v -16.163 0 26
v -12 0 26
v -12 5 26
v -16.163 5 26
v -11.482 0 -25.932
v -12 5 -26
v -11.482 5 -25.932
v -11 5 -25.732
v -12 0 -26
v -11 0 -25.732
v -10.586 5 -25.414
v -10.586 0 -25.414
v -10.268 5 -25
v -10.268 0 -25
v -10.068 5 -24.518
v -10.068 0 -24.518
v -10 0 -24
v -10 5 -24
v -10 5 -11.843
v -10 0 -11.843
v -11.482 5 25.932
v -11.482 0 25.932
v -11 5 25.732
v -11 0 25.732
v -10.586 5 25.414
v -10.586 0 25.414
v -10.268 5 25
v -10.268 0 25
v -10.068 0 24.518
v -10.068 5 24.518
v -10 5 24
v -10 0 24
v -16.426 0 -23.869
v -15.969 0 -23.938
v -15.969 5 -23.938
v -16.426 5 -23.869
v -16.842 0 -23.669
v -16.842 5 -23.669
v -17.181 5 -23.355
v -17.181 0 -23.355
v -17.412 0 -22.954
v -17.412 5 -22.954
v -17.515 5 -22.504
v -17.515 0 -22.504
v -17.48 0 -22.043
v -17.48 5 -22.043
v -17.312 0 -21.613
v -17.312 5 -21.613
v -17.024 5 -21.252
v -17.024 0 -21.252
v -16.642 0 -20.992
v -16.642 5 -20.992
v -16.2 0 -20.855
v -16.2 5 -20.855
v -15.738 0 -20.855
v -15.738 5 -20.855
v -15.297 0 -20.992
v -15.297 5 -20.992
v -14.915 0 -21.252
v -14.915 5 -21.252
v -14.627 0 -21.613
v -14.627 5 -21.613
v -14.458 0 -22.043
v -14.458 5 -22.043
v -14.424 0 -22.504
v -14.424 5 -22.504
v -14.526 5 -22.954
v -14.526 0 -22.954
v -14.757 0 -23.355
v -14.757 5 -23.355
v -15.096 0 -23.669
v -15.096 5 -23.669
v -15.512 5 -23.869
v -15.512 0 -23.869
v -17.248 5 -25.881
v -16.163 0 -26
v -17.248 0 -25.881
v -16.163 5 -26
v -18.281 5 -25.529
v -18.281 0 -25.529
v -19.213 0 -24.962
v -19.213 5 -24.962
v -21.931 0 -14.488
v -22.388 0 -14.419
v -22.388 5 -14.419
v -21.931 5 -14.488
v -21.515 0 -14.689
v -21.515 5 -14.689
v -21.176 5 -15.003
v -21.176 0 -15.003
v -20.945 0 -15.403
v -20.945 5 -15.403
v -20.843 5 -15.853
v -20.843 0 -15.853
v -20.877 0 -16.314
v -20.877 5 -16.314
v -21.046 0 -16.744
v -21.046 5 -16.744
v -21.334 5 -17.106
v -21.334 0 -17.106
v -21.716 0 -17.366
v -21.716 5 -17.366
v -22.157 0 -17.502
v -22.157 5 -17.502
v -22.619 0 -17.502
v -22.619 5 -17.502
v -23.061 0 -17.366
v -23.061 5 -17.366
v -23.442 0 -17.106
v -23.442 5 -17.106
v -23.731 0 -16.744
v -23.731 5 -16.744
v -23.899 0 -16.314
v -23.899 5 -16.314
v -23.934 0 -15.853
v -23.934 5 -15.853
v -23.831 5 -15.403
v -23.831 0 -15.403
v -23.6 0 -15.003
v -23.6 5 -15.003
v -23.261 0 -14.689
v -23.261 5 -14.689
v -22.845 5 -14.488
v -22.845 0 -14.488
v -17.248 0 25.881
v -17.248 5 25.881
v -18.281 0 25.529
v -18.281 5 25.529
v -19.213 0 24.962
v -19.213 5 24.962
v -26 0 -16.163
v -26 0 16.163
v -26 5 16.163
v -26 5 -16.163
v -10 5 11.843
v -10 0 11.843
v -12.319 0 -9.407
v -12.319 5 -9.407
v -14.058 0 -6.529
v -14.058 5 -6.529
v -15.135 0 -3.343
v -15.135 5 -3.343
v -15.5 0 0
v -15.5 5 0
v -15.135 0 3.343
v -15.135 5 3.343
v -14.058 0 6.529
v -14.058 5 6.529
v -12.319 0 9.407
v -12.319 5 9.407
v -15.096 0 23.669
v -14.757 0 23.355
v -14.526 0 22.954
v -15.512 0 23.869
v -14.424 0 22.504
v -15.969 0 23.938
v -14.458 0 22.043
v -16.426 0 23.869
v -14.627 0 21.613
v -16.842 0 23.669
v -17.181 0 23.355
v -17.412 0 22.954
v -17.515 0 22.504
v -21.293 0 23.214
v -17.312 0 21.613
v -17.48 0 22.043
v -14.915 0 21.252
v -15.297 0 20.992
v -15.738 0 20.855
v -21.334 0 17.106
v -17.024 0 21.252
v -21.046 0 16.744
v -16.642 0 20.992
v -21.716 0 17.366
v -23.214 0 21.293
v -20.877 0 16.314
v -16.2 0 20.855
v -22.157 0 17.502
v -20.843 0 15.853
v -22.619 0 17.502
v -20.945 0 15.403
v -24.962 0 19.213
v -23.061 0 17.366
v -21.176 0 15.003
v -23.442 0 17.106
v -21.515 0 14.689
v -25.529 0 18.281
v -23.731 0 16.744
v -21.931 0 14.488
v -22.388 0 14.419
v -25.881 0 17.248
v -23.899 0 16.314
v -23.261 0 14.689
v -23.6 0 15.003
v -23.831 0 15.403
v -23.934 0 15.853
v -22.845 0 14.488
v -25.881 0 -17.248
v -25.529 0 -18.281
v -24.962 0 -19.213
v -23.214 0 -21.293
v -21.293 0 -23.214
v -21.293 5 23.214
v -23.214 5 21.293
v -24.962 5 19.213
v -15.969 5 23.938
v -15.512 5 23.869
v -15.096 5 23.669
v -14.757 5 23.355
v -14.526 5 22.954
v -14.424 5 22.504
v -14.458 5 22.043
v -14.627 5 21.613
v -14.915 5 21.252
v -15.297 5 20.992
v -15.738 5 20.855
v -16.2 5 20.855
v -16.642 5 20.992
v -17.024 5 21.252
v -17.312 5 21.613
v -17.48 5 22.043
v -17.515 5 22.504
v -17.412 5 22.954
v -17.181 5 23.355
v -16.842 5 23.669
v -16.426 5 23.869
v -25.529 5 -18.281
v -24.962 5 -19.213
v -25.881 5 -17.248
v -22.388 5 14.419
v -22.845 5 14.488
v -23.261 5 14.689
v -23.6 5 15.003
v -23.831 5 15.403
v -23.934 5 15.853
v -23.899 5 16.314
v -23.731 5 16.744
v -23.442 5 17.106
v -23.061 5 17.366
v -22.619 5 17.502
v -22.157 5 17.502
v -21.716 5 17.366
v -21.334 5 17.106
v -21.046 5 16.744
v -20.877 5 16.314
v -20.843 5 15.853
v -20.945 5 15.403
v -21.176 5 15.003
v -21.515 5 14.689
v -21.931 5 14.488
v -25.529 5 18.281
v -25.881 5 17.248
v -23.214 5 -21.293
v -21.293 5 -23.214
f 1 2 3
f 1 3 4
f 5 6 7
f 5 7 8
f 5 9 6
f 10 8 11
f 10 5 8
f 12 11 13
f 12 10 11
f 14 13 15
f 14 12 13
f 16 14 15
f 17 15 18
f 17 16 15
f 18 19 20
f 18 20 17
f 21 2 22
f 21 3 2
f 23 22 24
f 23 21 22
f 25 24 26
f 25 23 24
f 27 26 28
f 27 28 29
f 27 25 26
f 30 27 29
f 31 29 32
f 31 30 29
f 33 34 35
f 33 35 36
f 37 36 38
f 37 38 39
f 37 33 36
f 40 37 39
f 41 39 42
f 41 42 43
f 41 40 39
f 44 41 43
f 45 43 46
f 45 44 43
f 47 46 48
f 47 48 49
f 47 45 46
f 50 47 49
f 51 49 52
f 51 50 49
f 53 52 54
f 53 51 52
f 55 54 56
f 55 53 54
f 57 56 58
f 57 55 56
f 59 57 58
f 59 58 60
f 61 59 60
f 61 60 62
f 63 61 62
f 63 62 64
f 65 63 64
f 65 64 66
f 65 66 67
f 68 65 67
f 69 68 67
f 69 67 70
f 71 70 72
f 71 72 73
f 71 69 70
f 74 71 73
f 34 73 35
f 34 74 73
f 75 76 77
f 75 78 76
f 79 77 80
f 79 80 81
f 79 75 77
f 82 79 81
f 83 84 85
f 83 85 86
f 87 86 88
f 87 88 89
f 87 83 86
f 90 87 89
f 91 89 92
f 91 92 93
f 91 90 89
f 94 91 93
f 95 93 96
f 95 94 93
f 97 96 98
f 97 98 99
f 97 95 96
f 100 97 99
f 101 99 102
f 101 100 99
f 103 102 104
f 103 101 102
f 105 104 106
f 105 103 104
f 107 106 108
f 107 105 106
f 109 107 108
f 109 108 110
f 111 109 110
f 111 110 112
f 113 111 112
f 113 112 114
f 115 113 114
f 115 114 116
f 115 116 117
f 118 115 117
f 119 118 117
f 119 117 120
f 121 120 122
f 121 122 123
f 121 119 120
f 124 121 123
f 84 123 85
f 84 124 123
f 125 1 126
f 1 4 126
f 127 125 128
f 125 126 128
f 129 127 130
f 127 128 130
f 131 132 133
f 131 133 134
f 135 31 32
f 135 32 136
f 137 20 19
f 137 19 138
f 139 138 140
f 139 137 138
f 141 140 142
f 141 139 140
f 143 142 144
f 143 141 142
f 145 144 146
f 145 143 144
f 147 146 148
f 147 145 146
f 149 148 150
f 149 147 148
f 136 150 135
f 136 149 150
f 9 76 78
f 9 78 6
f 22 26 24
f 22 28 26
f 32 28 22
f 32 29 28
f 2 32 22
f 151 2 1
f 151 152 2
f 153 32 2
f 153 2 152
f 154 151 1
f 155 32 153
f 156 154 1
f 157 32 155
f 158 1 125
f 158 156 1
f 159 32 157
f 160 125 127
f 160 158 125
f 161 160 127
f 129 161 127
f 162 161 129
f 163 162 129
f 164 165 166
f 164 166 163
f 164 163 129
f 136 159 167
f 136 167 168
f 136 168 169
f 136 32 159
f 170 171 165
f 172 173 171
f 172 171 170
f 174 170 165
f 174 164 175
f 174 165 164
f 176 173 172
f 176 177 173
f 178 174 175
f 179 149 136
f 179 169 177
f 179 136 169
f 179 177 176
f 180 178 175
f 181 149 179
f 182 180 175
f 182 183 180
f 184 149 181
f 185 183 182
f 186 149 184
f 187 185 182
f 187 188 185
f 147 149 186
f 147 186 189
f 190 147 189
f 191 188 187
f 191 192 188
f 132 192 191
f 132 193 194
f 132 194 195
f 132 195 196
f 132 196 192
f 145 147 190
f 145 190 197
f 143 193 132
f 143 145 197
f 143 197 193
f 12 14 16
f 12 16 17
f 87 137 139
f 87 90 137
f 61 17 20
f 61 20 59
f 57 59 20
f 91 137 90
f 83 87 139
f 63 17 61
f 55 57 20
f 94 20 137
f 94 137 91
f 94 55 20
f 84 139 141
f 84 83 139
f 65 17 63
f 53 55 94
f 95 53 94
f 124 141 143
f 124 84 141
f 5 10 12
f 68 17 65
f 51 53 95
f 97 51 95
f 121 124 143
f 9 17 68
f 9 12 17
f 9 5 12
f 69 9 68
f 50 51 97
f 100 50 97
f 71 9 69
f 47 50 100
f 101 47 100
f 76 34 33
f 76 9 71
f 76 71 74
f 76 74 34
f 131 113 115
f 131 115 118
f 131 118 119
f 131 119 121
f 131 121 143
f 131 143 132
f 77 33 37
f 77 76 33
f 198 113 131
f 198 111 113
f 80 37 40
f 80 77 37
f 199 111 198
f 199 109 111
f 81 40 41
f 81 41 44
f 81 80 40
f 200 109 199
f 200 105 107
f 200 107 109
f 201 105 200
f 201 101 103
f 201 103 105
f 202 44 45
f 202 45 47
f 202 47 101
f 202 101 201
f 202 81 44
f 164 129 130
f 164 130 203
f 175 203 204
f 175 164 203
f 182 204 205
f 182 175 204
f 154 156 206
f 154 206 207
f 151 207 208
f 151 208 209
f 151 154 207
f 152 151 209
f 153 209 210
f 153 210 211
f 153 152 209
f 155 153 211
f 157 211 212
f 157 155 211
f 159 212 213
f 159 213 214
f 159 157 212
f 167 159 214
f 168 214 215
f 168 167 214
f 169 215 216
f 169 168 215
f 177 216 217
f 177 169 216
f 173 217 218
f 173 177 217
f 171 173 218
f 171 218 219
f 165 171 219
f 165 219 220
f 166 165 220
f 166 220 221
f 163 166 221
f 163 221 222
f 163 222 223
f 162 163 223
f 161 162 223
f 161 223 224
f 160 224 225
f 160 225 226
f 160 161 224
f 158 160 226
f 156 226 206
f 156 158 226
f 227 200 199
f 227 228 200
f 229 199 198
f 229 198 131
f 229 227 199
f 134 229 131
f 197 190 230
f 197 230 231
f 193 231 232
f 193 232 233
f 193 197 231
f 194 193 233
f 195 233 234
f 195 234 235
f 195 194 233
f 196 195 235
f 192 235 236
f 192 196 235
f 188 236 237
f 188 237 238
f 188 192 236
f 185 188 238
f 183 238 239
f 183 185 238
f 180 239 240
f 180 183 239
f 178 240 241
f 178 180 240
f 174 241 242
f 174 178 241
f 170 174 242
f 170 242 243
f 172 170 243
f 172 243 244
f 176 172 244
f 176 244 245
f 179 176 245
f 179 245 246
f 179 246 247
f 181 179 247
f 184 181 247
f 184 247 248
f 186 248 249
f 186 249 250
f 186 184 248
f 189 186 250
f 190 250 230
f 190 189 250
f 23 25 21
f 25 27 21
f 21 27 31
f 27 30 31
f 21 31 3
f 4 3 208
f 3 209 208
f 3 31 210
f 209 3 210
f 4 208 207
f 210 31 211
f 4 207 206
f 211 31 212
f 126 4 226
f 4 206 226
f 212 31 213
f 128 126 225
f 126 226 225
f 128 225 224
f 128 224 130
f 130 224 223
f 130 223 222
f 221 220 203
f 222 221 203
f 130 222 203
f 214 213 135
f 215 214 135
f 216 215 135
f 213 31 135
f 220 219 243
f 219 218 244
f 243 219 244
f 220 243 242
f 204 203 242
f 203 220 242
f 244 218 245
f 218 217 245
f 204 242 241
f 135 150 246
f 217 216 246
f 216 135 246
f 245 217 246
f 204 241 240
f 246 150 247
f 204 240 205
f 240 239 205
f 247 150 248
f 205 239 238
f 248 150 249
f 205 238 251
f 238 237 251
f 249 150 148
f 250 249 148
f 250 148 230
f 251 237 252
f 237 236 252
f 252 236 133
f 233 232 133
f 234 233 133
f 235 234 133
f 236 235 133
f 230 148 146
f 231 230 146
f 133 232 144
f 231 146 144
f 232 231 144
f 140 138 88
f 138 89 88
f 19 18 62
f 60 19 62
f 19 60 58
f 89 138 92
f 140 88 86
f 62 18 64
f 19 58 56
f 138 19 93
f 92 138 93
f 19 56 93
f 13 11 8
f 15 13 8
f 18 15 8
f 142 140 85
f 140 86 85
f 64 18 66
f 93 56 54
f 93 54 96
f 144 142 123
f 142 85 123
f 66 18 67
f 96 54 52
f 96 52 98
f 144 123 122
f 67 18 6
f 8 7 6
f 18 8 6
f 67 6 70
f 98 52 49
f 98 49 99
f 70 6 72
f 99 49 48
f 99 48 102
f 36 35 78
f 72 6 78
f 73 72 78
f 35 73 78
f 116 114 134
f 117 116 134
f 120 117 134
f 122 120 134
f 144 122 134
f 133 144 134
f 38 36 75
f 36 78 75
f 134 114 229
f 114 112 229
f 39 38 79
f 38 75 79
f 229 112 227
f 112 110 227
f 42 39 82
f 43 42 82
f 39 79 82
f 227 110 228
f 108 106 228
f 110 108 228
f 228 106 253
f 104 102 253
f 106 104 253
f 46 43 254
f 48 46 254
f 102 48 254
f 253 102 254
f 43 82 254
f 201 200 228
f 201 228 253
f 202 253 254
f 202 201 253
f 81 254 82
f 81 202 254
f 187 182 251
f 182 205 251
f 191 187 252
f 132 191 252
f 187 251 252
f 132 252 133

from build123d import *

# Parameters (mm, degrees)
SKETCH_1_R          = 15.5
SKETCH_1_R_2        = 1.55
EXTRUDE_1_DEPTH     = 5
SKETCH_3_W          = 44.726871009
SKETCH_3_H          = 71.780776613
CUT_EXTRUDE_2_DEPTH = 10
FILLET_1_R          = 2
FILLET_2_R          = 5


with BuildPart() as part:
    # 草图1 → 凸台-拉伸1 (new body)
    with BuildSketch(Plane(origin=(0, 0, 0), x_dir=(1, 0, 0), z_dir=(0, 1, 0))):
        with BuildLine():
            Line((-17.783419244, 26), (17.783419244, 26))
            ThreePointArc((17.783419244, 26), (22.273863607, 22.273863607), (26, 17.783419244))
            Line((26, 17.783419244), (26, -17.783419244))
            ThreePointArc((26, -17.783419244), (22.273863607, -22.273863607), (17.783419244, -26))
            Line((17.783419244, -26), (-17.783419244, -26))
            ThreePointArc((-17.783419244, -26), (-22.273863607, -22.273863607), (-26, -17.783419244))
            Line((-26, -17.783419244), (-26, 17.783419244))
            ThreePointArc((-26, 17.783419244), (-22.273863607, 22.273863607), (-17.783419244, 26))
        make_face()
        with Locations(Location((0, 0, 0), (0, 0, 270))):
            Circle(SKETCH_1_R, mode=Mode.SUBTRACT)
        with Locations(Location((-22.388176755, 15.969331282, 0), (0, 0, 270))):
            Circle(SKETCH_1_R_2, mode=Mode.SUBTRACT)
        with Locations(Location((-15.969331282, 22.388176755, 0), (0, 0, 90))):
            Circle(SKETCH_1_R_2, mode=Mode.SUBTRACT)
        with Locations(Location((22.388176755, 15.969331282, 0), (0, 0, 90))):
            Circle(SKETCH_1_R_2, mode=Mode.SUBTRACT)
        with Locations(Location((15.969331282, 22.388176755, 0), (0, 0, 270))):
            Circle(SKETCH_1_R_2, mode=Mode.SUBTRACT)
        with Locations(Location((22.388176755, -15.969331282, 0), (0, 0, 270))):
            Circle(SKETCH_1_R_2, mode=Mode.SUBTRACT)
        with Locations(Location((15.969331282, -22.388176755, 0), (0, 0, 90))):
            Circle(SKETCH_1_R_2, mode=Mode.SUBTRACT)
        with Locations(Location((-22.388176755, -15.969331282, 0), (0, 0, 90))):
            Circle(SKETCH_1_R_2, mode=Mode.SUBTRACT)
        with Locations(Location((-15.969331282, -22.388176755, 0), (0, 0, 270))):
            Circle(SKETCH_1_R_2, mode=Mode.SUBTRACT)
    extrude(amount=EXTRUDE_1_DEPTH)

    # 草图3 → 切除-拉伸2 (cut)
    with BuildSketch(Plane(origin=(0, 5, 0), x_dir=(1, 0, 0), z_dir=(0, 1, 0))):
        with Locations((12.363435504, 5.528436561)):
            Rectangle(SKETCH_3_W, SKETCH_3_H)
    extrude(amount=-CUT_EXTRUDE_2_DEPTH, mode=Mode.SUBTRACT)

    # 圆角1
    fillet_1_edges = [part.edges().sort_by_distance(p)[0] for p in [
        (-10, 2.5, -26),
        (-10, 2.5, 26),
    ]]
    fillet(fillet_1_edges, radius=FILLET_1_R)

    # 圆角2
    fillet_2_edges = [part.edges().sort_by_distance(p)[0] for p in [
        (-17.783419244, 2.5, -26),
        (-17.783419244, 2.5, 26),
        (-26, 2.5, 17.783419244),
        (-26, 2.5, -17.783419244),
    ]]
    fillet(fillet_2_edges, radius=FILLET_2_R)


solid = part.part
